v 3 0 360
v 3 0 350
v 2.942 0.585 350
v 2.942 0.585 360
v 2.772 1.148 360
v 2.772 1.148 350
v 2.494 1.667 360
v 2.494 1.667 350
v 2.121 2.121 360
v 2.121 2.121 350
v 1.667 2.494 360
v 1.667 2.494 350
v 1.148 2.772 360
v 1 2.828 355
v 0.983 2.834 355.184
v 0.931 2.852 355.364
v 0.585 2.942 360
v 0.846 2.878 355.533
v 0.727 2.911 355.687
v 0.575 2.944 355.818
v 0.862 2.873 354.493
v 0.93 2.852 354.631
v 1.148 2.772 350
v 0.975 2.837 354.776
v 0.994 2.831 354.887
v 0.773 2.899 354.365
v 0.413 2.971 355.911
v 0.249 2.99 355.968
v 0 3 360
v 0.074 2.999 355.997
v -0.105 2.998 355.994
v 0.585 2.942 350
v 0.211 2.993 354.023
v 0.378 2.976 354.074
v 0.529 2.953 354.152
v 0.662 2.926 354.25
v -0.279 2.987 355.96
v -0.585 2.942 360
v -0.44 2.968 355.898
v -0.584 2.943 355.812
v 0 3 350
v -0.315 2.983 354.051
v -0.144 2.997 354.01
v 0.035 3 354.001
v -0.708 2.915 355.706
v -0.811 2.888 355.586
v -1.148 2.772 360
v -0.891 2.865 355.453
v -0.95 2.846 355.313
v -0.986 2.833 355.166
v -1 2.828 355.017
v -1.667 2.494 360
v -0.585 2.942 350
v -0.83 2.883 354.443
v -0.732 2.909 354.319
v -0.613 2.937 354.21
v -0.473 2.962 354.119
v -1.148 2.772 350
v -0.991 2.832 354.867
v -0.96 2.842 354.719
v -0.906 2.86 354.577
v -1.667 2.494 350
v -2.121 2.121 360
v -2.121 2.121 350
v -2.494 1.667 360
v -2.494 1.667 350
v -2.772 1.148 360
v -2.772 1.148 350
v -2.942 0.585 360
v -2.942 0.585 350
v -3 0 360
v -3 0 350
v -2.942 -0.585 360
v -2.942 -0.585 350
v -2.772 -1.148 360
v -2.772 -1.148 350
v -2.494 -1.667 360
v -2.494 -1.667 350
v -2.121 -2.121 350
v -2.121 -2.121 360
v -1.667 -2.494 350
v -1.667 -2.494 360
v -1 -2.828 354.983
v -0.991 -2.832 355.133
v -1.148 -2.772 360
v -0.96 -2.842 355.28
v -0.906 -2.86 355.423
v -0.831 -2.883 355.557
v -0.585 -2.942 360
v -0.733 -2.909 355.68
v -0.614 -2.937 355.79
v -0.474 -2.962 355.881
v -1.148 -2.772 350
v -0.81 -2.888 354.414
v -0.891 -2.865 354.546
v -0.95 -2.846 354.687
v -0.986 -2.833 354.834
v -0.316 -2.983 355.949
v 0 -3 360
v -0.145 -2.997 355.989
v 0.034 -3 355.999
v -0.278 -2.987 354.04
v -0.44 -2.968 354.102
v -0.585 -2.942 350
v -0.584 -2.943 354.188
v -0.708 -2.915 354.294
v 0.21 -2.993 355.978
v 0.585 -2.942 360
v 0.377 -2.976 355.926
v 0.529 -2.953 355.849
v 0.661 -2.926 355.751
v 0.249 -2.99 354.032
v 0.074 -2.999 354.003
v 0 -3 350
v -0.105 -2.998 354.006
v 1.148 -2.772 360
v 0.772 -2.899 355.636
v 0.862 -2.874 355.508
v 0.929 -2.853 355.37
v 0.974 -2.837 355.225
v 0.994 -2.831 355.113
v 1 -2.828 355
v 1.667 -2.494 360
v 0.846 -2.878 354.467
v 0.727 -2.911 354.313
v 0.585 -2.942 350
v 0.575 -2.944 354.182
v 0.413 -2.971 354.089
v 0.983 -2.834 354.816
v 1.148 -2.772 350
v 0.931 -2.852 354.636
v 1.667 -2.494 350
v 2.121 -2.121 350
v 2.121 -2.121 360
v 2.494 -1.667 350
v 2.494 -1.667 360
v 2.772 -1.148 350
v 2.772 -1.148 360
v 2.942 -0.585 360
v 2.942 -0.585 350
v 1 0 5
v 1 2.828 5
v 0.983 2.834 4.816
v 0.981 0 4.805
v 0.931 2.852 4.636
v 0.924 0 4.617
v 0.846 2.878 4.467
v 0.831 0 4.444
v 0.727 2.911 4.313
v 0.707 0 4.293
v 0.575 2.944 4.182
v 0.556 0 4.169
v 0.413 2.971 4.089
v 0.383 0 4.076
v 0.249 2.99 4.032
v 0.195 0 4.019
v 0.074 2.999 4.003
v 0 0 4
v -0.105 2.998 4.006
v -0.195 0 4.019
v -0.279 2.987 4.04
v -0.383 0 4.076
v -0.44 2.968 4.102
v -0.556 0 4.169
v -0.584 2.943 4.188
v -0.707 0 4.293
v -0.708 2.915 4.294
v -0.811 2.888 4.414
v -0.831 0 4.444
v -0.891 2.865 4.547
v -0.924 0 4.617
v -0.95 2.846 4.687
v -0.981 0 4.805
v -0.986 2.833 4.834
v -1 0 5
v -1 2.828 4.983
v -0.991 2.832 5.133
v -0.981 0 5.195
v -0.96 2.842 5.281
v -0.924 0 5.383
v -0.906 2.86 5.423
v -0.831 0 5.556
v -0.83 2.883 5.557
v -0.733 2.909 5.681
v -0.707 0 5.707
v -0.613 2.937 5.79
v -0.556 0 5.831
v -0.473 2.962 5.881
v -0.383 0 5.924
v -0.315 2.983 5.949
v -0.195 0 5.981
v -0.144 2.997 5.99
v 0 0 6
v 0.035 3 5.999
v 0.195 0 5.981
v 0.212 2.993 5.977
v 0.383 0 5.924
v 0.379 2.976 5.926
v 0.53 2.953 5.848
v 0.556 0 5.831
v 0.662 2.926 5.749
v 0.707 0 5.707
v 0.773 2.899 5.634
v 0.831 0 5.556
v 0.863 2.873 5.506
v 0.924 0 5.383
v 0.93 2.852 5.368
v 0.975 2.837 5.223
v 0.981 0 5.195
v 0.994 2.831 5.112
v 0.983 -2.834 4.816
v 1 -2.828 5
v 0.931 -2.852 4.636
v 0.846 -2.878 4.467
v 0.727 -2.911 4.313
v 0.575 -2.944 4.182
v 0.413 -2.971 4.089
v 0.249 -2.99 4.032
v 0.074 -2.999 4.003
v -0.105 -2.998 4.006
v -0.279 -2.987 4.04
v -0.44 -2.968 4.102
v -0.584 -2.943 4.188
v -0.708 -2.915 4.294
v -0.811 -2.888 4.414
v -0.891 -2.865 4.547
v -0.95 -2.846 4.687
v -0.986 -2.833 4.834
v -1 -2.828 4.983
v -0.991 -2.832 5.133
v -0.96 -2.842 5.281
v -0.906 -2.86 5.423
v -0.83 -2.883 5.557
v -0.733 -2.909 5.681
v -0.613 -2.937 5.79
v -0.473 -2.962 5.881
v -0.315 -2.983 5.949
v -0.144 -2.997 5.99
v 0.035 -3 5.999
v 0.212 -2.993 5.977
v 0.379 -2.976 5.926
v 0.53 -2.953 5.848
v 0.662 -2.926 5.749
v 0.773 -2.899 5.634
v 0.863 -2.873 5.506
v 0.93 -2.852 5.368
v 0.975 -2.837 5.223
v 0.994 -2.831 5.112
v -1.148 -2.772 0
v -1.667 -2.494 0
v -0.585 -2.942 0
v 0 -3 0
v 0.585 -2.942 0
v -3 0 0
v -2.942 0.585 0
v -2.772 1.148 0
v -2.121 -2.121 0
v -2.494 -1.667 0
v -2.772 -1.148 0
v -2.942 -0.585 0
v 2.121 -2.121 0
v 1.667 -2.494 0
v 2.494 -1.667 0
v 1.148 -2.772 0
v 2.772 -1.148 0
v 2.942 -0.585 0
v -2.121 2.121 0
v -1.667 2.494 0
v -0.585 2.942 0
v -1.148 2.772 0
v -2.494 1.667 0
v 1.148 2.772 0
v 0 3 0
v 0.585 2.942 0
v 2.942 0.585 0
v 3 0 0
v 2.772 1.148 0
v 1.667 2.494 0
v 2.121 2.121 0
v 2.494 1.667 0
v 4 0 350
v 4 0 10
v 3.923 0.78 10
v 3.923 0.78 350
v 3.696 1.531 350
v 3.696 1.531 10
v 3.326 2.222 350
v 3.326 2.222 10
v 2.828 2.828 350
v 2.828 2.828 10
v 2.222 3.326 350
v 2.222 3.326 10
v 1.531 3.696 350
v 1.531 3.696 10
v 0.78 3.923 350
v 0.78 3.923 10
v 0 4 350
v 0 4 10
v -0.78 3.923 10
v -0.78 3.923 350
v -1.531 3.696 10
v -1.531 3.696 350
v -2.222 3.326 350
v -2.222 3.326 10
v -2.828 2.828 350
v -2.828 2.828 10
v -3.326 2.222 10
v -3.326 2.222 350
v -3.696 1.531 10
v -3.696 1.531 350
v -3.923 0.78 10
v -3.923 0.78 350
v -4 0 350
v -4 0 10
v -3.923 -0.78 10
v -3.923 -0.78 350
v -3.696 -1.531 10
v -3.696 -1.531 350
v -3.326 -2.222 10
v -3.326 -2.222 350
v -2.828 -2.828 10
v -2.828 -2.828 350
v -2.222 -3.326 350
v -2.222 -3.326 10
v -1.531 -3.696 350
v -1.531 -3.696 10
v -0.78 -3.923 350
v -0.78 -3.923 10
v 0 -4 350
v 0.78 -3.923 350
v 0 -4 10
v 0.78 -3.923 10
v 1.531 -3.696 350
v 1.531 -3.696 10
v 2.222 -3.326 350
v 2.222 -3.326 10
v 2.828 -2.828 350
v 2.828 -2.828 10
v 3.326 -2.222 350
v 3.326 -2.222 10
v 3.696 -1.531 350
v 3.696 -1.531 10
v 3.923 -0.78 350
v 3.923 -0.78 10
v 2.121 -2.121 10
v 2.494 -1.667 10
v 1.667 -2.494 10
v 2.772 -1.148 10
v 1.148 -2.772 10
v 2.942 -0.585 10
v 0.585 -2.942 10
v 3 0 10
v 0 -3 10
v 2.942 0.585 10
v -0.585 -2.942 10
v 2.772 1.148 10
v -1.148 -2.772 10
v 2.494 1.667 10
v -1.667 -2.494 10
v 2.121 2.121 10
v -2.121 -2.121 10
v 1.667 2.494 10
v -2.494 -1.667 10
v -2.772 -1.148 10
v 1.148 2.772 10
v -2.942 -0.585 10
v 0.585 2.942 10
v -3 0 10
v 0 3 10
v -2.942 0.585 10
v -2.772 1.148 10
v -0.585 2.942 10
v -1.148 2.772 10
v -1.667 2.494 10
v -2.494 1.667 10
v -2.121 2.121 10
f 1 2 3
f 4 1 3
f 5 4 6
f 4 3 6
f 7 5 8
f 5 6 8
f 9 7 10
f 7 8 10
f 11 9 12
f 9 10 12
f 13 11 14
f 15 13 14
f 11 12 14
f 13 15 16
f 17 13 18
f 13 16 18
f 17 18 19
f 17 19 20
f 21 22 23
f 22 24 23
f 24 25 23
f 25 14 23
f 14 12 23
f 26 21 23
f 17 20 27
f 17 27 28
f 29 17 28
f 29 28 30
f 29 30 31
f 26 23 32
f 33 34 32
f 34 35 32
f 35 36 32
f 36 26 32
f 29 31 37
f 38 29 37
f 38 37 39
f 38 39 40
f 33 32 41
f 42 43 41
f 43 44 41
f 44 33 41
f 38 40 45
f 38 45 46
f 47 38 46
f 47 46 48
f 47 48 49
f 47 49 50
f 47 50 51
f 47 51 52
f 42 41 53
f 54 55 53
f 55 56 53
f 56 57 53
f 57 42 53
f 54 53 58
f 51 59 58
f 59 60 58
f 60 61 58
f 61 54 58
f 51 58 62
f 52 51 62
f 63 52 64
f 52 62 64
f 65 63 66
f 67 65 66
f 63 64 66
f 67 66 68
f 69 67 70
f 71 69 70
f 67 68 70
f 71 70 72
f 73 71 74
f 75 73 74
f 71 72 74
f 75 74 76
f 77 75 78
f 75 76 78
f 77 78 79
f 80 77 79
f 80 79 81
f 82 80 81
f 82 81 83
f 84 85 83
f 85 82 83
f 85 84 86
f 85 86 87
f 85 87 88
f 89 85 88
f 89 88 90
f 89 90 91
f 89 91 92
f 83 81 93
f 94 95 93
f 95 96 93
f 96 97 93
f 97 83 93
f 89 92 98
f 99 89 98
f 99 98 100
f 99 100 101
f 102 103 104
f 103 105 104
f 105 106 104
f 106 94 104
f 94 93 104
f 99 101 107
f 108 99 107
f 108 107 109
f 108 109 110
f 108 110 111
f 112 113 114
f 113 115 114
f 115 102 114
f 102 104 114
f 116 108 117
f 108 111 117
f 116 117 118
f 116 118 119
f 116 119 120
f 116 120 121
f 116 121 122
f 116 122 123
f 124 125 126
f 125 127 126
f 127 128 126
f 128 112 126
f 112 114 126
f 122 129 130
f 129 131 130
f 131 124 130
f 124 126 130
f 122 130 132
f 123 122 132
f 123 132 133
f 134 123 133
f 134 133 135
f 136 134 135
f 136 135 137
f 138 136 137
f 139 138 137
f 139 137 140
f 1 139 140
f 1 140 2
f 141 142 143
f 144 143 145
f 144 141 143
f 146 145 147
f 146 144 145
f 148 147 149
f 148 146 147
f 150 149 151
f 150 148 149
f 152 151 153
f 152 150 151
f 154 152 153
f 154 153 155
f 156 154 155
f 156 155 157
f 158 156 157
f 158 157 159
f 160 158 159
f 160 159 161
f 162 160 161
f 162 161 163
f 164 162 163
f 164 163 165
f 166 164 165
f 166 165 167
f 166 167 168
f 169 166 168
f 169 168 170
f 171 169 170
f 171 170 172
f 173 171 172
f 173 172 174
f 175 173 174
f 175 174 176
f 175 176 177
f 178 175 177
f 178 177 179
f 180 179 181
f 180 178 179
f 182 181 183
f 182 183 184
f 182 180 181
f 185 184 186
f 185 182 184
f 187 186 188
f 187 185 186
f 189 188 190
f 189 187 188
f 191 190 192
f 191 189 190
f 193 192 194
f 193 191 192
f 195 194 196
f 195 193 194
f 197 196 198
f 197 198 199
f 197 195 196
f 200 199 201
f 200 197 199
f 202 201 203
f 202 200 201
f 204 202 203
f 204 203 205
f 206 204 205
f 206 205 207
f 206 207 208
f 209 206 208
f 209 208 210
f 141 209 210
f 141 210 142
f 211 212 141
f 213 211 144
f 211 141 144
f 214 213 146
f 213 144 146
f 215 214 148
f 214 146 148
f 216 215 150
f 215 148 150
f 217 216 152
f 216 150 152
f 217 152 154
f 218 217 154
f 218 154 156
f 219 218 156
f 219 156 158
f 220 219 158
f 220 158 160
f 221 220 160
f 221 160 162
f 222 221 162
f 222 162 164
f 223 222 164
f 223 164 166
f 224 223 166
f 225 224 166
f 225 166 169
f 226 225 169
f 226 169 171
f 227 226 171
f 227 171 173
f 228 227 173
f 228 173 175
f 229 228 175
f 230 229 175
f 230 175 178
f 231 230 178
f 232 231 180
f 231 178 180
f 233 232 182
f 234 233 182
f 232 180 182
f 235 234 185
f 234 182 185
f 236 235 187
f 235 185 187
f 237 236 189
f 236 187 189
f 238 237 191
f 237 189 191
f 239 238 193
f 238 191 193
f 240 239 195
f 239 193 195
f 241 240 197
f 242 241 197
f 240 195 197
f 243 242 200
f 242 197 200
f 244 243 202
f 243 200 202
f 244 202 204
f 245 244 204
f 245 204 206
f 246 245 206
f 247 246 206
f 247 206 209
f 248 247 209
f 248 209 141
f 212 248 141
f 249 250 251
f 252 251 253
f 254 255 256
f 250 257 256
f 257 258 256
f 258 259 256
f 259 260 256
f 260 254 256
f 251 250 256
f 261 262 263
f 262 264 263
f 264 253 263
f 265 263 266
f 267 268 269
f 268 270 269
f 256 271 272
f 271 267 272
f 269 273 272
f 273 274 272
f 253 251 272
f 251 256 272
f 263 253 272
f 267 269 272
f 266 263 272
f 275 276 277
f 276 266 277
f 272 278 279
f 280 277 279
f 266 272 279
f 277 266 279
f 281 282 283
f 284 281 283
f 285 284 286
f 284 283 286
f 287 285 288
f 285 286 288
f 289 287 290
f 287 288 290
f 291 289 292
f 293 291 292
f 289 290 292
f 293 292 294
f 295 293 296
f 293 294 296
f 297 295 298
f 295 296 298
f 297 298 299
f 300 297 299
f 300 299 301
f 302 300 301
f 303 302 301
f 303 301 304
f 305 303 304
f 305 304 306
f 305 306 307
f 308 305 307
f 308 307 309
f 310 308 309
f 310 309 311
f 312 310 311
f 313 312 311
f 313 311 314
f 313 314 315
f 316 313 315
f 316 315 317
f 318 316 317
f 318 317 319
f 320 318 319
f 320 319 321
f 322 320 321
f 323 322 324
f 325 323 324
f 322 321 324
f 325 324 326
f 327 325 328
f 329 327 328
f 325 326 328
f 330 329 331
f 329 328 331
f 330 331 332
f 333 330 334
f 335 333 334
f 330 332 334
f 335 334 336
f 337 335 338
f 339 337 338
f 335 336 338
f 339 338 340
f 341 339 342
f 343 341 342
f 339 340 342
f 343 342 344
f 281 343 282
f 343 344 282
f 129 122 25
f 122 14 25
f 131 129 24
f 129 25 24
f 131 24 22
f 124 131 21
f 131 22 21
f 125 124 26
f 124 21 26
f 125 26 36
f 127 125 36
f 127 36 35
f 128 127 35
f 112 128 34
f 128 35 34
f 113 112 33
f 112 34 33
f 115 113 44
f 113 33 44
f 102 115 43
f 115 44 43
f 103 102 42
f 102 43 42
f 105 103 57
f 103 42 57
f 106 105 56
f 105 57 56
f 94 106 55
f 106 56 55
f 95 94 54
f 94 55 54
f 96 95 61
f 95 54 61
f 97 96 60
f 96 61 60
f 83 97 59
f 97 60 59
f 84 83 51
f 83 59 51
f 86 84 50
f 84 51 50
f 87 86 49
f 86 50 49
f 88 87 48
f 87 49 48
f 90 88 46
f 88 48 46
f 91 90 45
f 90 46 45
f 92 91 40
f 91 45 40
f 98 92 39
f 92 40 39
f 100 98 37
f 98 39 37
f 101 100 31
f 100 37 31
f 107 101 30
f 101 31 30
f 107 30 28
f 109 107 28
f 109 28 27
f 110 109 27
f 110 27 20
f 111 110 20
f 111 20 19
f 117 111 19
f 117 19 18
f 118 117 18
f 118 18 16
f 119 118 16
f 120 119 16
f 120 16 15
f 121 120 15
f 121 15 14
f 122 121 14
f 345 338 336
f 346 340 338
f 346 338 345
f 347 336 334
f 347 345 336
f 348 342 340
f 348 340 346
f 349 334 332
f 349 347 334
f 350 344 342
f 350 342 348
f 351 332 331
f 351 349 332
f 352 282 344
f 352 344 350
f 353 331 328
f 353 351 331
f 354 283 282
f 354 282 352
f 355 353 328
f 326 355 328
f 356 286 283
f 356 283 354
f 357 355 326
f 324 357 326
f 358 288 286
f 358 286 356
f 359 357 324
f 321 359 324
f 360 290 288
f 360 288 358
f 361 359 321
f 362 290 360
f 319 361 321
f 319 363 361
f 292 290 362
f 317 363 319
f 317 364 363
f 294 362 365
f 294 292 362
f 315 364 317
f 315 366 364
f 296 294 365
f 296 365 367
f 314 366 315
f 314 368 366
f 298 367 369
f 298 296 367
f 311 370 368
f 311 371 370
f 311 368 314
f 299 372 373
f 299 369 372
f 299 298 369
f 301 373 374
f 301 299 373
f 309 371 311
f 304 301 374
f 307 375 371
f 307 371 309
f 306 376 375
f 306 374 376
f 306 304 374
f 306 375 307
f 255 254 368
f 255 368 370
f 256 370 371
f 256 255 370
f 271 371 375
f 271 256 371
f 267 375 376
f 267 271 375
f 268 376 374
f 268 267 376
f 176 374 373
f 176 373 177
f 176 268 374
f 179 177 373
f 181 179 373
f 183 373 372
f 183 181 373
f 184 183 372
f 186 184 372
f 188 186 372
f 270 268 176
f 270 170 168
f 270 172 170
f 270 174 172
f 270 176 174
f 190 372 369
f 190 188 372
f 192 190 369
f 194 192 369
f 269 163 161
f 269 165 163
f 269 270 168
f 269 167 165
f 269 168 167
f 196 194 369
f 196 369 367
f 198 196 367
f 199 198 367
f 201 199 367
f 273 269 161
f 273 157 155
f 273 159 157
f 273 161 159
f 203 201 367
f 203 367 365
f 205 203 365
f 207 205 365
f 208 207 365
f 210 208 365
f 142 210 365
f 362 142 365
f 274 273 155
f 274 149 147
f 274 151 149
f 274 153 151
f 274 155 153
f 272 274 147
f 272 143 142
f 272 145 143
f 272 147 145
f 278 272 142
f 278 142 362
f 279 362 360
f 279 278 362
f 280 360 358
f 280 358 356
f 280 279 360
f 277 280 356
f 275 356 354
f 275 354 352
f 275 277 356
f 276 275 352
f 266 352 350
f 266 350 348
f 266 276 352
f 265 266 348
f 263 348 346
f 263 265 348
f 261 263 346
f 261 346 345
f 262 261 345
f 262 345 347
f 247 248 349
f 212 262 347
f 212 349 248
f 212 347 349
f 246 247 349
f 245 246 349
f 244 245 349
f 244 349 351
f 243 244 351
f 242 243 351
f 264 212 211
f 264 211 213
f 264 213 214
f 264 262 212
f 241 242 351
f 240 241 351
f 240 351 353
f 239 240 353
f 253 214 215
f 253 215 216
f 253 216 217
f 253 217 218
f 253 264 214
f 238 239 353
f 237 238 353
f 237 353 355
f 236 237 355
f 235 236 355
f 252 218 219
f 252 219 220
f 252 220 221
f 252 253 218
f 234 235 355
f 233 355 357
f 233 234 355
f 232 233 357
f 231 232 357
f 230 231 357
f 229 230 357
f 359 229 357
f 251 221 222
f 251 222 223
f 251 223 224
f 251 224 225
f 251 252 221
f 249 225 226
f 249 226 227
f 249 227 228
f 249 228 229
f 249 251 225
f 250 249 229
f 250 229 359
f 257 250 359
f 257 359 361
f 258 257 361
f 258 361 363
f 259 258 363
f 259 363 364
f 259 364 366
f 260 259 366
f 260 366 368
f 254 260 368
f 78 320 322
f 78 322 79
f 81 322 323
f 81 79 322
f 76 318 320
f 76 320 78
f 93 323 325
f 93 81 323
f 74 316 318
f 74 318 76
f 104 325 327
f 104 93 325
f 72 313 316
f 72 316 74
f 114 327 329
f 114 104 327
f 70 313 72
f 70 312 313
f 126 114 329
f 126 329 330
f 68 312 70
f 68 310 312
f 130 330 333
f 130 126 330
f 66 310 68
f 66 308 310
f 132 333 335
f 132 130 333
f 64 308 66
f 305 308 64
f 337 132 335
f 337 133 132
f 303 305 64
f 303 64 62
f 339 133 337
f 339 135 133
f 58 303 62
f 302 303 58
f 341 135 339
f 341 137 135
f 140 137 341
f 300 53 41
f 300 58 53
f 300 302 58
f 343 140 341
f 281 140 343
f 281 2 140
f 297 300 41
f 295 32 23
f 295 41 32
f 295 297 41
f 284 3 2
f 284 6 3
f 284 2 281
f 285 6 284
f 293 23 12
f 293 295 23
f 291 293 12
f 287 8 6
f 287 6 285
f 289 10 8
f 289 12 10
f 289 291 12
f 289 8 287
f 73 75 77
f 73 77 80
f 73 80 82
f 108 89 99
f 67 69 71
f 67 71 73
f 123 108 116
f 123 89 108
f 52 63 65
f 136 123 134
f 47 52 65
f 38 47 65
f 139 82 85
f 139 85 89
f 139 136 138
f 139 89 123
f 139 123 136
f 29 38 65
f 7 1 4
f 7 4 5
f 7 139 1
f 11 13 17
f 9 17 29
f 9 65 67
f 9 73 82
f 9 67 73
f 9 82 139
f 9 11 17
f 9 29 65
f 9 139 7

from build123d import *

# Parameters (mm, degrees)
SKETCH1_R               = 4
BOSS_EXTRUDE1_DEPTH     = 350
SKETCH2_R               = 3
BOSS_EXTRUDE2_DEPTH     = 10
SKETCH3_R               = 1
CUT_EXTRUDE1_DEPTH      = 3
SKETCH5_R               = 4
SKETCH5_R_2             = 3
CUT_EXTRUDE3_DEPTH      = 10
SKETCH6_R               = 1
CUT_EXTRUDE4_DEPTH      = 5
CUT_EXTRUDE4_DEPTH_BACK = 5


with BuildPart() as part:
    # Sketch1 → Boss-Extrude1 (new body)
    with BuildSketch(Plane.XY):
        Circle(SKETCH1_R)
    extrude(amount=BOSS_EXTRUDE1_DEPTH)

    # Sketch2 → Boss-Extrude2 (add)
    with BuildSketch(Plane.XY.offset(350)):
        Circle(SKETCH2_R)
    extrude(amount=BOSS_EXTRUDE2_DEPTH)

    # Sketch3 → Cut-Extrude1 (cut, symmetric)
    with BuildSketch(Plane(origin=(0, 0, 0), x_dir=(1, 0, 0), z_dir=(0, 1, 0))):
        with Locations((0, -355)):
            Circle(SKETCH3_R)
    extrude(amount=CUT_EXTRUDE1_DEPTH, both=True, mode=Mode.SUBTRACT)

    # Sketch5 → Cut-Extrude3 (cut)
    with BuildSketch(Plane(origin=(0, 0, 0), x_dir=(-1, 0, 0), z_dir=(0, 0, -1))):
        Circle(SKETCH5_R)
        Circle(SKETCH5_R_2, mode=Mode.SUBTRACT)
    extrude(amount=-CUT_EXTRUDE3_DEPTH, mode=Mode.SUBTRACT)

    # Sketch6 → Cut-Extrude4 (cut, two sides)
    with BuildSketch(Plane(origin=(0, 0, 0), x_dir=(1, 0, 0), z_dir=(0, 1, 0))) as cut_extrude4_sk:
        with Locations((0, -5)):
            Circle(SKETCH6_R)
    extrude(amount=CUT_EXTRUDE4_DEPTH, mode=Mode.SUBTRACT)
    extrude(cut_extrude4_sk.sketch, amount=-CUT_EXTRUDE4_DEPTH_BACK, mode=Mode.SUBTRACT)


solid = part.part
